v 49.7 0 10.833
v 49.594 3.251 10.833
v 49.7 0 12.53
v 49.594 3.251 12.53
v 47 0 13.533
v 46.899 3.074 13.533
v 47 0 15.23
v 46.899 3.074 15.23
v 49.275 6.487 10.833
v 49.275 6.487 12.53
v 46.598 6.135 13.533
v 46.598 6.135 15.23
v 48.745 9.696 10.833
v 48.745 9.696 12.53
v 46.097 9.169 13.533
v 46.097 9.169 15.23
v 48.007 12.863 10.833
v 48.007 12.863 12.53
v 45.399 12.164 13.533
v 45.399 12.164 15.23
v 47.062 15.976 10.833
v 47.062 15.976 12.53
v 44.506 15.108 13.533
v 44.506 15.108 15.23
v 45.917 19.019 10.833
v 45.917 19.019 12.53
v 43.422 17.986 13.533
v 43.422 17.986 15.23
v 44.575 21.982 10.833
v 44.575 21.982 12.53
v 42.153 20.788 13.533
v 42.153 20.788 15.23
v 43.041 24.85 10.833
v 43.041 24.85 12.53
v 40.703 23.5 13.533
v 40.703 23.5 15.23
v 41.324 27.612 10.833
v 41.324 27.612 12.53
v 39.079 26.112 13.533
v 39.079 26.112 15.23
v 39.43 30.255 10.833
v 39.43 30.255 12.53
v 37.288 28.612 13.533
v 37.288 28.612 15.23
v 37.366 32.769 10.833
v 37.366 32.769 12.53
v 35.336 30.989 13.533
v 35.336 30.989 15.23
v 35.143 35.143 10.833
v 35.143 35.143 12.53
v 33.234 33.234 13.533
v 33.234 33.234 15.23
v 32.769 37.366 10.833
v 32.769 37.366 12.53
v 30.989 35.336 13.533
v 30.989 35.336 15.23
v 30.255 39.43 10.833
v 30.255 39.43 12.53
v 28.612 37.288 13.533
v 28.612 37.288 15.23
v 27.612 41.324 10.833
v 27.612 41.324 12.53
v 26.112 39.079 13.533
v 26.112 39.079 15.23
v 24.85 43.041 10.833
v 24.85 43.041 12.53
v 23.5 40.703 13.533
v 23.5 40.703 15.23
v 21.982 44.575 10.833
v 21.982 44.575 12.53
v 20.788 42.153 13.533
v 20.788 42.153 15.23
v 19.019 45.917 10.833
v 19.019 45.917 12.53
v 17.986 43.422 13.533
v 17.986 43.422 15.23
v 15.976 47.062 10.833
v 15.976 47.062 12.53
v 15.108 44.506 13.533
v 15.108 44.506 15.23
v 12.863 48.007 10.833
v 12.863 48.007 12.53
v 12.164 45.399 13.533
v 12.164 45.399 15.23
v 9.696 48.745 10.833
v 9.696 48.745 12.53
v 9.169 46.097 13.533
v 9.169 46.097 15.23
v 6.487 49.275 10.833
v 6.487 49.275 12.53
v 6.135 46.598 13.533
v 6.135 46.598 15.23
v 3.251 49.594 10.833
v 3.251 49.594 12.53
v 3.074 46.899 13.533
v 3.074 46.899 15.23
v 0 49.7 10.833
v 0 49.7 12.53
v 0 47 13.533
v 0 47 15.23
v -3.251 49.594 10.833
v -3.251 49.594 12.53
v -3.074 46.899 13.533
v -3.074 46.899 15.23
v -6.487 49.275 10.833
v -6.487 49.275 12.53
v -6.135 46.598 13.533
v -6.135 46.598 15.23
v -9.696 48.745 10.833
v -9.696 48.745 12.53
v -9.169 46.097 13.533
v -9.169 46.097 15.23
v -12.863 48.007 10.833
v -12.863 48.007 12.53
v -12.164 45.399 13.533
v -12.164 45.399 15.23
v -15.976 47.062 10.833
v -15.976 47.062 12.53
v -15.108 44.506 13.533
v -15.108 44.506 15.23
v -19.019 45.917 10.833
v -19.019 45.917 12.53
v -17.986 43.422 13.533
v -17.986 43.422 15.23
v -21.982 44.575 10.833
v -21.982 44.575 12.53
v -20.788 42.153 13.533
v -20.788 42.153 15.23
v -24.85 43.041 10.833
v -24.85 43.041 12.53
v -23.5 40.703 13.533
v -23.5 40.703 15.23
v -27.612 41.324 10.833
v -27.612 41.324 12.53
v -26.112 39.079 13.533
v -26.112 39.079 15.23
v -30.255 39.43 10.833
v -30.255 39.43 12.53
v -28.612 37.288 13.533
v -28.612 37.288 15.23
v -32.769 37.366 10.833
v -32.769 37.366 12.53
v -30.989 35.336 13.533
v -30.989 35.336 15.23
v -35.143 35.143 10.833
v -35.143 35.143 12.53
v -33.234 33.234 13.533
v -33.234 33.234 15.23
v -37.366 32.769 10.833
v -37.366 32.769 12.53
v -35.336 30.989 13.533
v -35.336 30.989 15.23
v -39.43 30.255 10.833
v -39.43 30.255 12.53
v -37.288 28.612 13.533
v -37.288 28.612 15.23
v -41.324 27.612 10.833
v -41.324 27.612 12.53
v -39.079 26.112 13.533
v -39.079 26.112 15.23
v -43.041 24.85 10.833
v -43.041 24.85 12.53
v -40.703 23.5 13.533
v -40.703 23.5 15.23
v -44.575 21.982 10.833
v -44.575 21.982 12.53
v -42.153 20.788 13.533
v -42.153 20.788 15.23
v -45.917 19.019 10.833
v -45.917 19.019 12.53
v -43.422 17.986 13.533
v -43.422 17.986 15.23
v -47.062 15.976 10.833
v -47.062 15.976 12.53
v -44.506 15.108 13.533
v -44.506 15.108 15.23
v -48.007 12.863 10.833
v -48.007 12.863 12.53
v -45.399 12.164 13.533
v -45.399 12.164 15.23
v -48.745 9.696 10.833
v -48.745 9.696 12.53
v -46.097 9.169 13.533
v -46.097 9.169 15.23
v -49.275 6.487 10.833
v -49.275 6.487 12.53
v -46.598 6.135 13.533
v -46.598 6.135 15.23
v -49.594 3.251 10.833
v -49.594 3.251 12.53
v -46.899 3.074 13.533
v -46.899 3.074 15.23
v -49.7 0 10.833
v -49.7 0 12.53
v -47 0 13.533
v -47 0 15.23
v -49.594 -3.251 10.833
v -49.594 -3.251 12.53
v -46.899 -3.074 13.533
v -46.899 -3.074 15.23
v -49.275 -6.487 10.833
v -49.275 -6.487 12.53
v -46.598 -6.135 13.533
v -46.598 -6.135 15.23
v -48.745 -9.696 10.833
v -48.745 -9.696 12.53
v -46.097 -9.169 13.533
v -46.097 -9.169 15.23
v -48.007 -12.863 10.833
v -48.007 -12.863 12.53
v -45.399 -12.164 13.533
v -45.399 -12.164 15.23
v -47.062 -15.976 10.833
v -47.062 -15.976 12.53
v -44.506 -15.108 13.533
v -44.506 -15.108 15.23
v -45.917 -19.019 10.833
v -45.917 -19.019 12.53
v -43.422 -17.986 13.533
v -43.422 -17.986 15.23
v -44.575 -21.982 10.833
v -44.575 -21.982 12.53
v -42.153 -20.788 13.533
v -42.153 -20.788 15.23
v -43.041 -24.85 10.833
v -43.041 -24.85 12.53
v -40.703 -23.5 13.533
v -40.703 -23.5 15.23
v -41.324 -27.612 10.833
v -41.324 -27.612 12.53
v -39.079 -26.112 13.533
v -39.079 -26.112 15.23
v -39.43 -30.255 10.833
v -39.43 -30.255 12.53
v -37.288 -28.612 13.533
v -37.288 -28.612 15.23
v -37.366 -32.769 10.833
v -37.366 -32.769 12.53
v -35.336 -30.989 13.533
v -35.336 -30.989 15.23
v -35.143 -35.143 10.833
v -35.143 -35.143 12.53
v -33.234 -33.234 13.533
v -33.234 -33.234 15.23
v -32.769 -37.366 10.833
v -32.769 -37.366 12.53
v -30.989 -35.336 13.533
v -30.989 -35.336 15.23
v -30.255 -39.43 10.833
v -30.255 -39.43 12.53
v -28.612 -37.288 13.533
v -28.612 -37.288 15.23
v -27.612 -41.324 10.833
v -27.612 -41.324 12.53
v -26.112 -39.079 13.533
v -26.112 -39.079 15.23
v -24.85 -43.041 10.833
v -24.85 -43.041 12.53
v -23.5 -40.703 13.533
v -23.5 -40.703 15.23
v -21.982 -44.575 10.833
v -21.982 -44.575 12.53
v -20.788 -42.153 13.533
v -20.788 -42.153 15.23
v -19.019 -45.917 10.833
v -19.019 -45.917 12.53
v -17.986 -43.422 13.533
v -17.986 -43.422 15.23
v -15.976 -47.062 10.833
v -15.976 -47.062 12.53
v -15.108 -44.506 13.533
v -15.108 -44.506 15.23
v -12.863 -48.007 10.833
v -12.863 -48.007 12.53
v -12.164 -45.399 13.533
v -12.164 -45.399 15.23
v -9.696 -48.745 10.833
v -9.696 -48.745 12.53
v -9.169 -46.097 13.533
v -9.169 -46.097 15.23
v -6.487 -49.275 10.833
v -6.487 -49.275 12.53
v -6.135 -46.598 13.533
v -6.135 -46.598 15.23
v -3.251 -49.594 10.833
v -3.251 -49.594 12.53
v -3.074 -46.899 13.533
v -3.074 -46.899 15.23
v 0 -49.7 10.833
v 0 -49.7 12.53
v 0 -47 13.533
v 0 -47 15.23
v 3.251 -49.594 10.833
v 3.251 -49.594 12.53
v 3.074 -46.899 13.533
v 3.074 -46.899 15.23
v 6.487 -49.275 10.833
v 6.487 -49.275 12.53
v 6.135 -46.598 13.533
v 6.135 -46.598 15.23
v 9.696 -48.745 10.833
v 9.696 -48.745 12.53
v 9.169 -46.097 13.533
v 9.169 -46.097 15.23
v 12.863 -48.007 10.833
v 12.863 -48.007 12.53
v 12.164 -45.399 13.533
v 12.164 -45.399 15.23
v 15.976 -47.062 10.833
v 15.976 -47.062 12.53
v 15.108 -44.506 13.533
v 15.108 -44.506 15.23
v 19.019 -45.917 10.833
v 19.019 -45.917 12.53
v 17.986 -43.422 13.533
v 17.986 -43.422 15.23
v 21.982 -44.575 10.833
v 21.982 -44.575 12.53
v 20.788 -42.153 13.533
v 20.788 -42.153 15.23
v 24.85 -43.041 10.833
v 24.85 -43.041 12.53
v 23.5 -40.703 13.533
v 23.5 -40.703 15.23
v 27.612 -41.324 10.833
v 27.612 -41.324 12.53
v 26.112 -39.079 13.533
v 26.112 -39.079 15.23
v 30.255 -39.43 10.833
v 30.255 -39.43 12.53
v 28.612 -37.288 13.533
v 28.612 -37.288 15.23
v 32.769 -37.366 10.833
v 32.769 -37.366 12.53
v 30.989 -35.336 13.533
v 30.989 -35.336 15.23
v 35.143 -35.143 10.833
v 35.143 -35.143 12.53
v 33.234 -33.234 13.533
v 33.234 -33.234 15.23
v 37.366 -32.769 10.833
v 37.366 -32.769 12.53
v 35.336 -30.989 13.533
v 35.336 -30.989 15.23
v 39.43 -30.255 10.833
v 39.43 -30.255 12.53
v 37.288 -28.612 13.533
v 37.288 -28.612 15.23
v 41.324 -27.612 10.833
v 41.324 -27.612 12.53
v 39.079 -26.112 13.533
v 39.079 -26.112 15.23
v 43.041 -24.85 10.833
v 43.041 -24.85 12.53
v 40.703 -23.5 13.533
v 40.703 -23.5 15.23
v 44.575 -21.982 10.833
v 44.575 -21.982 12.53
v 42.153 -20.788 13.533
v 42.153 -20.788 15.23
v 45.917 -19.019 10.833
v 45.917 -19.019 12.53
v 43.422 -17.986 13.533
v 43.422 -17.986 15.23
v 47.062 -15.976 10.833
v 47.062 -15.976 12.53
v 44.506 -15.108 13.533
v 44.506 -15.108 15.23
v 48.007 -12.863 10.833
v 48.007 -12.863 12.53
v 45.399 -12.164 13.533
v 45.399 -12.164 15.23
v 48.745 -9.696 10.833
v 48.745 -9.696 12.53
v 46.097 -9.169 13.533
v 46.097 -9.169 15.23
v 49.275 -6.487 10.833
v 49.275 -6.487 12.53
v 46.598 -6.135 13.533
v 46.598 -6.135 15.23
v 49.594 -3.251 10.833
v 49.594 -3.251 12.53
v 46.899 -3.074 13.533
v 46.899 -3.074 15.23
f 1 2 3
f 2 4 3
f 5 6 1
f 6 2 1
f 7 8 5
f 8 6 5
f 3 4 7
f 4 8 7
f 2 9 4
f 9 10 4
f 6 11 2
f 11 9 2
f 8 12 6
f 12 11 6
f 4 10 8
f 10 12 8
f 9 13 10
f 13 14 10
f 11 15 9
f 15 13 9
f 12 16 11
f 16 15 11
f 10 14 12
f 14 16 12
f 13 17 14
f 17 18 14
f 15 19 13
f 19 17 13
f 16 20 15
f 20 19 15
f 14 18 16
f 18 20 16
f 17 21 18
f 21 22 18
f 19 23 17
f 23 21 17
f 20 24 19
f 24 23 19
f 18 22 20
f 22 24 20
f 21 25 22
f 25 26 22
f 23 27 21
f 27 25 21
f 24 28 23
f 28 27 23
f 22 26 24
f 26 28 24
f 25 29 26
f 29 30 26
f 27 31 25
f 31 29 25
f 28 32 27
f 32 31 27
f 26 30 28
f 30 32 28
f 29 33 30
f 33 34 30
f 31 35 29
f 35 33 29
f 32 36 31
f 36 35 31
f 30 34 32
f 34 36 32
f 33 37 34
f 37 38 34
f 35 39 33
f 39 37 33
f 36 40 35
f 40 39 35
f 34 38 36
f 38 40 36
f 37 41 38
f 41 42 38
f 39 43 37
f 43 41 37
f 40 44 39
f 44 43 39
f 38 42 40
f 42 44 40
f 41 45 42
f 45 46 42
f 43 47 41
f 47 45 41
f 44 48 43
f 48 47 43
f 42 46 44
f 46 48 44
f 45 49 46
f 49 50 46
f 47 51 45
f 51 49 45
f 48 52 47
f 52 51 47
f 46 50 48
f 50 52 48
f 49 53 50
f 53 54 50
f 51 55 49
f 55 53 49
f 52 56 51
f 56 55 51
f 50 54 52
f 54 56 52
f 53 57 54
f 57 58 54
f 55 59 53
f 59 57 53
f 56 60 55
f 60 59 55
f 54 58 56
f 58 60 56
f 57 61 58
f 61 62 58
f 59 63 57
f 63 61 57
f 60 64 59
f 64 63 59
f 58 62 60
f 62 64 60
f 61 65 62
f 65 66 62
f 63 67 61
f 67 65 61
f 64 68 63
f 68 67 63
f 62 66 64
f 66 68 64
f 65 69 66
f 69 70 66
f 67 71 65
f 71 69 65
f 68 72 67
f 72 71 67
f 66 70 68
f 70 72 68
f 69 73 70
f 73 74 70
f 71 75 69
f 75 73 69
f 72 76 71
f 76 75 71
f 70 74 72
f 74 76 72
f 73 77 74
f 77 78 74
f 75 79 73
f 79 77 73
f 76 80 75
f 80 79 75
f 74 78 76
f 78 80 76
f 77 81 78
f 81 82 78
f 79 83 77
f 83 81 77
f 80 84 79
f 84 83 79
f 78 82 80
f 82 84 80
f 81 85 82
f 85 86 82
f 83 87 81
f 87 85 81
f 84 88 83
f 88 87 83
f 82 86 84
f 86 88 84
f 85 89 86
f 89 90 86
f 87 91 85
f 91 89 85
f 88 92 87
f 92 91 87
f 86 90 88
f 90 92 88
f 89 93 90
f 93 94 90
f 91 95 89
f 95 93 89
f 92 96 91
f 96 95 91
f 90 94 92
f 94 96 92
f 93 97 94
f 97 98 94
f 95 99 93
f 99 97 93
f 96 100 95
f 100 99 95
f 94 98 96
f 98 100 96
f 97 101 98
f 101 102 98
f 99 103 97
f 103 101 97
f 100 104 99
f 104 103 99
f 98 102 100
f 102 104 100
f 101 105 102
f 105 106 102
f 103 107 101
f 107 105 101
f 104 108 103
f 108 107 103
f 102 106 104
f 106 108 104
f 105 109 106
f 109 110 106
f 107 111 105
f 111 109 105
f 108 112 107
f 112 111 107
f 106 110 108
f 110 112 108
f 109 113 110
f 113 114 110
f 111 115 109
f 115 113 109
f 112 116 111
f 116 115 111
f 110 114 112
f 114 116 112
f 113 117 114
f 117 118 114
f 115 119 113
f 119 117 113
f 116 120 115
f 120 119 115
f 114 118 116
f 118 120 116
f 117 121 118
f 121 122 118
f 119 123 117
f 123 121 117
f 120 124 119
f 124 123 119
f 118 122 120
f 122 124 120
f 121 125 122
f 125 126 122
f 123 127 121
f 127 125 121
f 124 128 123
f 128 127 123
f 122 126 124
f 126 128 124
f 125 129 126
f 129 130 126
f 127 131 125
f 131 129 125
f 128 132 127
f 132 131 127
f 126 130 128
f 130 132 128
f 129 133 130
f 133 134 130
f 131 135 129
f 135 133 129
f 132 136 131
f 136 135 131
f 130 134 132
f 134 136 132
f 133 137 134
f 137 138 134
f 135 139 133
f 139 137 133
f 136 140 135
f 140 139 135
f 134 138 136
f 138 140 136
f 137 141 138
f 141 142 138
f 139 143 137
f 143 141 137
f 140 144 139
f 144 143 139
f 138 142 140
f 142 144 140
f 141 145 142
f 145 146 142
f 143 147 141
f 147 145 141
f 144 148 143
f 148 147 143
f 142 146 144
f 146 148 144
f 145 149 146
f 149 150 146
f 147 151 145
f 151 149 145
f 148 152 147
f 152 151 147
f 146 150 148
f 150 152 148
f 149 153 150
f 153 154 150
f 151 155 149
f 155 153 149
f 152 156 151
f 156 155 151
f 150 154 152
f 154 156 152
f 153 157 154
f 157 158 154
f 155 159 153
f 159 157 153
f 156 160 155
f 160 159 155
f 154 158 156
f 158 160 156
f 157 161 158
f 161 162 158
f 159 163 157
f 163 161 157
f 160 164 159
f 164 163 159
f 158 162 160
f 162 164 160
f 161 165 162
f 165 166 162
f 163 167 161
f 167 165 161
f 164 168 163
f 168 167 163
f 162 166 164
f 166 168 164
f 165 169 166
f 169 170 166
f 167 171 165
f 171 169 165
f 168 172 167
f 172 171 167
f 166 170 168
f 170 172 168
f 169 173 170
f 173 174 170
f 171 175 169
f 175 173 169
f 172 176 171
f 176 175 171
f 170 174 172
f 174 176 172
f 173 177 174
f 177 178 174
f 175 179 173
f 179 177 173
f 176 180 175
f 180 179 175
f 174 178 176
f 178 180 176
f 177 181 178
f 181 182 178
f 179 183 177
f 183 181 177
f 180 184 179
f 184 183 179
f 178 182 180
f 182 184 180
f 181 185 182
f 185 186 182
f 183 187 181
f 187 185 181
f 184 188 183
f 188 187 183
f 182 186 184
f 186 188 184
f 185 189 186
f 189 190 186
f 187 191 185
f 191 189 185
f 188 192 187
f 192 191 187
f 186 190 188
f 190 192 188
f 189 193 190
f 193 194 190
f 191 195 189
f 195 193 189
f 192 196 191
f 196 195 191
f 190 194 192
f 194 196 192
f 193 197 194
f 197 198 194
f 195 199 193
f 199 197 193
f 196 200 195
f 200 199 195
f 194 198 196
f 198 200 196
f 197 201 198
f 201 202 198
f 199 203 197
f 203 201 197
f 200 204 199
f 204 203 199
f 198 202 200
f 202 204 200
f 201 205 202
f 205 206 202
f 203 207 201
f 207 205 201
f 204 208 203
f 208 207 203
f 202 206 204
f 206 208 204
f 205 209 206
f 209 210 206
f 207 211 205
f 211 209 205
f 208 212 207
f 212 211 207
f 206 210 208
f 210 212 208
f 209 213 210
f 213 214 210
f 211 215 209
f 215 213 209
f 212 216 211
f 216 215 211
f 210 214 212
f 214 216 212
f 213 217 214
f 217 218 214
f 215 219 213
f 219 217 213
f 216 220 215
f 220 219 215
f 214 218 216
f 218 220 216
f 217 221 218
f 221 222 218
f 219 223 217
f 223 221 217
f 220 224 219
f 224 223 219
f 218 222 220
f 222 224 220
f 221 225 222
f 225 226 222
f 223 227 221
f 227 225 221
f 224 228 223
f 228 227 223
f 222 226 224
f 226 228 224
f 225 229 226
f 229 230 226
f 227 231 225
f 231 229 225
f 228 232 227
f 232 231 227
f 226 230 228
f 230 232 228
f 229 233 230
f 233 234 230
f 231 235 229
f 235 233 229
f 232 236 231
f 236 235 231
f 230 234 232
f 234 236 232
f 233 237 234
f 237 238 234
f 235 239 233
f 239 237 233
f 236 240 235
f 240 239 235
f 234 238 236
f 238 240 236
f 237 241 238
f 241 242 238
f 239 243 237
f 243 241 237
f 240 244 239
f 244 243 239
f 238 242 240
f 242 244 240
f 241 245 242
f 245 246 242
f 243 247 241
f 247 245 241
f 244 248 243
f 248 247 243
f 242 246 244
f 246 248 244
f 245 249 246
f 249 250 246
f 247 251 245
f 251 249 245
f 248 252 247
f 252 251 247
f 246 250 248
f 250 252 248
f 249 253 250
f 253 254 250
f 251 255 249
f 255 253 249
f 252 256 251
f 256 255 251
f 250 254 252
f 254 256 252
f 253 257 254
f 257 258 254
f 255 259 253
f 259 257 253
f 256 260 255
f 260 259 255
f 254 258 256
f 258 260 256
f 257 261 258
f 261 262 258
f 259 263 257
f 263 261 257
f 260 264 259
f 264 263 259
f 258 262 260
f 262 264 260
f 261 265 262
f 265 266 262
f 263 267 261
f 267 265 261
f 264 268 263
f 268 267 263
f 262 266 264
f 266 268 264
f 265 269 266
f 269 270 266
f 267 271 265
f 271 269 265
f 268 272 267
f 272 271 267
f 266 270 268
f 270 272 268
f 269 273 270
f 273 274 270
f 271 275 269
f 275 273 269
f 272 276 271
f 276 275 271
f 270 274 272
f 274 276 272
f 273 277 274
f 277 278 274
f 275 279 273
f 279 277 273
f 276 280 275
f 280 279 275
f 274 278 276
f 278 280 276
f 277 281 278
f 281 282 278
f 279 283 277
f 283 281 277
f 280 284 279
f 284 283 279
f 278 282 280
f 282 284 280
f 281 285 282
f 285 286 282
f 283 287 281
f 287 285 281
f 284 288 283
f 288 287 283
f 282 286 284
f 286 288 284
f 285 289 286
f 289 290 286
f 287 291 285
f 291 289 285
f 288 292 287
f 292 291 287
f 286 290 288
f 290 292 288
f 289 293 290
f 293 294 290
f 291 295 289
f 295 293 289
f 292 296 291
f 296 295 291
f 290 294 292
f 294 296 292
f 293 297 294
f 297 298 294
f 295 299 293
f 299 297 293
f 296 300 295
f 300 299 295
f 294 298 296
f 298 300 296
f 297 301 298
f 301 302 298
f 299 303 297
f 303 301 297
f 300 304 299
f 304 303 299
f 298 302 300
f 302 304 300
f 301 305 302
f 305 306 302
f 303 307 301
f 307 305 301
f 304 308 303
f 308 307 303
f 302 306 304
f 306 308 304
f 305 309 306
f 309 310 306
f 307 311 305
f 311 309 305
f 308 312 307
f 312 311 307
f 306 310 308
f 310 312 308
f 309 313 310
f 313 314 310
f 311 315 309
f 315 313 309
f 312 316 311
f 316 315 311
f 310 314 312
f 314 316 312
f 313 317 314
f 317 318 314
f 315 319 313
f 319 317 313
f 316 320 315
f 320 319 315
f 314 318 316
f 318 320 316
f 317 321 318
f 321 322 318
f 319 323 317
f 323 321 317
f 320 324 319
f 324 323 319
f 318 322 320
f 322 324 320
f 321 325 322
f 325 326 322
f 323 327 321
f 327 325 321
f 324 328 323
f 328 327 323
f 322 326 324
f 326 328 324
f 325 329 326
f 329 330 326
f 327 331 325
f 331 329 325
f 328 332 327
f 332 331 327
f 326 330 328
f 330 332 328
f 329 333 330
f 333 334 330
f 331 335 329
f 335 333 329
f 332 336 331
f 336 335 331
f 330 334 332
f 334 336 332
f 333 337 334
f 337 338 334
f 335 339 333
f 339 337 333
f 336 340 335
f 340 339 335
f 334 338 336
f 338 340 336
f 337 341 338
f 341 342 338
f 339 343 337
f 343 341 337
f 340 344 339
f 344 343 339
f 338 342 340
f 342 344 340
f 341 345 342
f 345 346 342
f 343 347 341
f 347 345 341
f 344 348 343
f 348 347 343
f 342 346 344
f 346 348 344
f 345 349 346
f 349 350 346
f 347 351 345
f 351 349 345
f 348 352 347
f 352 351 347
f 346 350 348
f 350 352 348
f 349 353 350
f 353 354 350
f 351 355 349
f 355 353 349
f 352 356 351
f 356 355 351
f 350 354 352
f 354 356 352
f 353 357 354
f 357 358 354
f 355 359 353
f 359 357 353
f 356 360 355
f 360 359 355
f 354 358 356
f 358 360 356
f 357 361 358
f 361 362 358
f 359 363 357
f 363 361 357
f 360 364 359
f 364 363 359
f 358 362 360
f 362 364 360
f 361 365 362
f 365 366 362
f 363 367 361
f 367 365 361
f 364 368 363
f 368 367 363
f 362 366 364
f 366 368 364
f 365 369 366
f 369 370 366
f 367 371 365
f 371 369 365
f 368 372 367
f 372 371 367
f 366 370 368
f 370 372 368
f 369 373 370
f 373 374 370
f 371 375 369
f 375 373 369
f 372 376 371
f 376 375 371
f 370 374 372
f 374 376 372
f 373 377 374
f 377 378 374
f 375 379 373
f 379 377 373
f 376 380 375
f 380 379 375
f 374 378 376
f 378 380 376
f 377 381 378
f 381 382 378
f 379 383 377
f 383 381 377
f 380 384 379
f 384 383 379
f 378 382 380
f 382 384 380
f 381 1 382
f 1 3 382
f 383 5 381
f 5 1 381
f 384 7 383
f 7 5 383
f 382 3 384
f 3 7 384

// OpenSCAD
include <../lib/servo-duct-manifold-lib.scad>;
$fn = 96;
iris_body_gasket();
